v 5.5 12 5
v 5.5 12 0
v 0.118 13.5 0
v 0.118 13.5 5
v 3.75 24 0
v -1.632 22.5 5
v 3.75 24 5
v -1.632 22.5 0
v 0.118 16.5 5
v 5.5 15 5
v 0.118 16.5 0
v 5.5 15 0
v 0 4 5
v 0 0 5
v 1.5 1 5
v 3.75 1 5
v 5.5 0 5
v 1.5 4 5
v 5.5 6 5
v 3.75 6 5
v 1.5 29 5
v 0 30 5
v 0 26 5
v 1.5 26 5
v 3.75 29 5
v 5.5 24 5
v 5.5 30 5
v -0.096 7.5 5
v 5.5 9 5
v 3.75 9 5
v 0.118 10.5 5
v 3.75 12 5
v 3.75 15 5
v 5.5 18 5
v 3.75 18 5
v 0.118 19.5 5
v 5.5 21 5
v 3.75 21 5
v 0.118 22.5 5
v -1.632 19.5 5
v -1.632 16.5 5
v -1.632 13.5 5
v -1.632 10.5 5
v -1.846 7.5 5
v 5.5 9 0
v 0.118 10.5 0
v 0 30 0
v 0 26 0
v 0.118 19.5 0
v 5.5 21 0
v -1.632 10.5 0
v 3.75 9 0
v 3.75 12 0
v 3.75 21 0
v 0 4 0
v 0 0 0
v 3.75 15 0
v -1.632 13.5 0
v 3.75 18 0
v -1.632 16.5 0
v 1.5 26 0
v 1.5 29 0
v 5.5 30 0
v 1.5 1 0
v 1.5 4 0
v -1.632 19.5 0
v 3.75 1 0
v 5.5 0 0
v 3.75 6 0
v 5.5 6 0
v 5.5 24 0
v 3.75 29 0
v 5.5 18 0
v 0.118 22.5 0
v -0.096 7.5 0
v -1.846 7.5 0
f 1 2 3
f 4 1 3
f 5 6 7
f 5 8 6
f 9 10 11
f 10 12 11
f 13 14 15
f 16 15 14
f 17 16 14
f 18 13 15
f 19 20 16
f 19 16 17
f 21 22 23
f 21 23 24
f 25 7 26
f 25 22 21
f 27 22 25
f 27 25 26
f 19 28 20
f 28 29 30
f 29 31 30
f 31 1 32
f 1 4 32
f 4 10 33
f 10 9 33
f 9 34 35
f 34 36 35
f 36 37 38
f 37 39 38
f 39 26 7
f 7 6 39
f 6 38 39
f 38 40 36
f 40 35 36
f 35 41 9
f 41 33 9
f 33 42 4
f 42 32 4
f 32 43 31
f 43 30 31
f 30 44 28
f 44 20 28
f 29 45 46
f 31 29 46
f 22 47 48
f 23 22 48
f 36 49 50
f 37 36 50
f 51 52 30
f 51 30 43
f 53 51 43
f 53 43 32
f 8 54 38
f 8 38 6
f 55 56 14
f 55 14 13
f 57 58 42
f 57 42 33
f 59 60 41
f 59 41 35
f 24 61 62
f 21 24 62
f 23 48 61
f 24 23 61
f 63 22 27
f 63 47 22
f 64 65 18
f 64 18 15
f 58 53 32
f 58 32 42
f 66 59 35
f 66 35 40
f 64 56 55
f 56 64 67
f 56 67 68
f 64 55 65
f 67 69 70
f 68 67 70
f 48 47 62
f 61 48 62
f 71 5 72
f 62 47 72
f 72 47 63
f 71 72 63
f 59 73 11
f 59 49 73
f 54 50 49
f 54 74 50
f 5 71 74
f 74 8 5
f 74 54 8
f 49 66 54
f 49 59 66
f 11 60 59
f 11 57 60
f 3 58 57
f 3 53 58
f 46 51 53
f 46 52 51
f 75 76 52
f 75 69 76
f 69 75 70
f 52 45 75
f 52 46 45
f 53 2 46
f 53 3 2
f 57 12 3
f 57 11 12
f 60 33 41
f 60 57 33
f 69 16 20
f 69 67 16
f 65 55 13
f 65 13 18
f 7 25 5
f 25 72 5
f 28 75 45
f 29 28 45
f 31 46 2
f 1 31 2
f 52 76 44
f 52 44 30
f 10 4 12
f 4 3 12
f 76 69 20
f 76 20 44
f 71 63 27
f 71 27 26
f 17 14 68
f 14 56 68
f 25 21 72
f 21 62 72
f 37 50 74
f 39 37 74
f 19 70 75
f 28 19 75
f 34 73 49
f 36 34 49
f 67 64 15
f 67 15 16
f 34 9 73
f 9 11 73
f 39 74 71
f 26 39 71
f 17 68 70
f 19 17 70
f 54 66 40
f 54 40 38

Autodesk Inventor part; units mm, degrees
ref_plane "YZ Plane" through (0, 0, 0) normal (1, 0, 0) x (0, 1, 0)
ref_plane "XZ Plane" through (0, 0, 0) normal (0, 1, 0) x (-1, 0, 0)
ref_plane "XY Plane" through (0, 0, 0) normal (0, 0, 1) x (1, 0, 0)
sketch "Sketch2" plane through (0, 0, 0) normal (0, 0, 1) x (1, 0, 0)
  line L0 (0, 0) -> (0, 4)
  line L1 (0, 4) -> (1.5, 4)
  line L2 (0, 0) -> (5.5, 0)
  line L3 (5.5, 0) -> (5.5, 6)
  line L4 (1.5, 4) -> (1.5, 1)
  line L5 (1.5, 1) -> (3.75, 1)
  line L6 (3.75, 1) -> (3.75, 6)
  line L7 (3.75, 6) -> (-1.8459, 7.5)
  line L8 (-1.8459, 7.5) -> (3.75, 9)
  line L9 (5.5, 6) -> (-0.0959, 7.5)
  line L10 (-0.0959, 7.5) -> (5.5, 9)
  line L11 (5.5, 9) -> (0.1177, 10.5)
  line L12 (3.75, 9) -> (-1.6323, 10.5)
  line L13 (-1.6323, 10.5) -> (3.75, 12)
  line L14 (0.1177, 10.5) -> (5.5, 12)
  line L15 (5.5, 12) -> (0.1177, 13.5)
  line L16 (3.75, 12) -> (-1.6323, 13.5)
  line L17 (-1.6323, 13.5) -> (3.75, 15)
  line L18 (0.1177, 13.5) -> (5.5, 15)
  line L19 (5.5, 15) -> (0.1177, 16.5)
  line L20 (3.75, 15) -> (-1.6323, 16.5)
  line L21 (-1.6323, 16.5) -> (3.75, 18)
  line L22 (0.1177, 16.5) -> (5.5, 18)
  line L23 (5.5, 18) -> (0.1177, 19.5)
  line L24 (3.75, 18) -> (-1.6323, 19.5)
  line L25 (-1.6323, 19.5) -> (3.75, 21)
  line L26 (0.1177, 19.5) -> (5.5, 21)
  line L27 (5.5, 21) -> (0.1177, 22.5)
  line L28 (3.75, 21) -> (-1.6323, 22.5)
  line L29 (-1.6323, 22.5) -> (3.75, 24)
  line L30 (0.1177, 22.5) -> (5.5, 24)
  line L31 (6.6857, 15) -> (8.563, 15) construction
  line L32 (0, 30) -> (0, 26)
  line L33 (0, 26) -> (1.5, 26)
  line L34 (0, 30) -> (5.5, 30)
  line L35 (5.5, 30) -> (5.5, 24)
  line L36 (1.5, 26) -> (1.5, 29)
  line L37 (1.5, 29) -> (3.75, 29)
  line L38 (3.75, 29) -> (3.75, 24)
  dimension "d14" = 4
  dimension "d15" = 1.5
  dimension "d16" = 5.5
  dimension "d17" = 6
  dimension "d18" = 3
  dimension "d19" = 2.25
  dimension "d24" = 5
  dimension "d25" = 3
  dimension "d28" = 1.5
  dimension "d29" = 0
  dimension "d37" = 15.573
  dimension "d38" = 15
  dimension "d39" = 3.063
  dimension "d40" = 1.1857
extrude "Extrusion2" add sketch "Sketch2" along normal blind 5
equation "\"d28\" = 0.5 * d25"
properties part number "Spring Mk 1.1"
